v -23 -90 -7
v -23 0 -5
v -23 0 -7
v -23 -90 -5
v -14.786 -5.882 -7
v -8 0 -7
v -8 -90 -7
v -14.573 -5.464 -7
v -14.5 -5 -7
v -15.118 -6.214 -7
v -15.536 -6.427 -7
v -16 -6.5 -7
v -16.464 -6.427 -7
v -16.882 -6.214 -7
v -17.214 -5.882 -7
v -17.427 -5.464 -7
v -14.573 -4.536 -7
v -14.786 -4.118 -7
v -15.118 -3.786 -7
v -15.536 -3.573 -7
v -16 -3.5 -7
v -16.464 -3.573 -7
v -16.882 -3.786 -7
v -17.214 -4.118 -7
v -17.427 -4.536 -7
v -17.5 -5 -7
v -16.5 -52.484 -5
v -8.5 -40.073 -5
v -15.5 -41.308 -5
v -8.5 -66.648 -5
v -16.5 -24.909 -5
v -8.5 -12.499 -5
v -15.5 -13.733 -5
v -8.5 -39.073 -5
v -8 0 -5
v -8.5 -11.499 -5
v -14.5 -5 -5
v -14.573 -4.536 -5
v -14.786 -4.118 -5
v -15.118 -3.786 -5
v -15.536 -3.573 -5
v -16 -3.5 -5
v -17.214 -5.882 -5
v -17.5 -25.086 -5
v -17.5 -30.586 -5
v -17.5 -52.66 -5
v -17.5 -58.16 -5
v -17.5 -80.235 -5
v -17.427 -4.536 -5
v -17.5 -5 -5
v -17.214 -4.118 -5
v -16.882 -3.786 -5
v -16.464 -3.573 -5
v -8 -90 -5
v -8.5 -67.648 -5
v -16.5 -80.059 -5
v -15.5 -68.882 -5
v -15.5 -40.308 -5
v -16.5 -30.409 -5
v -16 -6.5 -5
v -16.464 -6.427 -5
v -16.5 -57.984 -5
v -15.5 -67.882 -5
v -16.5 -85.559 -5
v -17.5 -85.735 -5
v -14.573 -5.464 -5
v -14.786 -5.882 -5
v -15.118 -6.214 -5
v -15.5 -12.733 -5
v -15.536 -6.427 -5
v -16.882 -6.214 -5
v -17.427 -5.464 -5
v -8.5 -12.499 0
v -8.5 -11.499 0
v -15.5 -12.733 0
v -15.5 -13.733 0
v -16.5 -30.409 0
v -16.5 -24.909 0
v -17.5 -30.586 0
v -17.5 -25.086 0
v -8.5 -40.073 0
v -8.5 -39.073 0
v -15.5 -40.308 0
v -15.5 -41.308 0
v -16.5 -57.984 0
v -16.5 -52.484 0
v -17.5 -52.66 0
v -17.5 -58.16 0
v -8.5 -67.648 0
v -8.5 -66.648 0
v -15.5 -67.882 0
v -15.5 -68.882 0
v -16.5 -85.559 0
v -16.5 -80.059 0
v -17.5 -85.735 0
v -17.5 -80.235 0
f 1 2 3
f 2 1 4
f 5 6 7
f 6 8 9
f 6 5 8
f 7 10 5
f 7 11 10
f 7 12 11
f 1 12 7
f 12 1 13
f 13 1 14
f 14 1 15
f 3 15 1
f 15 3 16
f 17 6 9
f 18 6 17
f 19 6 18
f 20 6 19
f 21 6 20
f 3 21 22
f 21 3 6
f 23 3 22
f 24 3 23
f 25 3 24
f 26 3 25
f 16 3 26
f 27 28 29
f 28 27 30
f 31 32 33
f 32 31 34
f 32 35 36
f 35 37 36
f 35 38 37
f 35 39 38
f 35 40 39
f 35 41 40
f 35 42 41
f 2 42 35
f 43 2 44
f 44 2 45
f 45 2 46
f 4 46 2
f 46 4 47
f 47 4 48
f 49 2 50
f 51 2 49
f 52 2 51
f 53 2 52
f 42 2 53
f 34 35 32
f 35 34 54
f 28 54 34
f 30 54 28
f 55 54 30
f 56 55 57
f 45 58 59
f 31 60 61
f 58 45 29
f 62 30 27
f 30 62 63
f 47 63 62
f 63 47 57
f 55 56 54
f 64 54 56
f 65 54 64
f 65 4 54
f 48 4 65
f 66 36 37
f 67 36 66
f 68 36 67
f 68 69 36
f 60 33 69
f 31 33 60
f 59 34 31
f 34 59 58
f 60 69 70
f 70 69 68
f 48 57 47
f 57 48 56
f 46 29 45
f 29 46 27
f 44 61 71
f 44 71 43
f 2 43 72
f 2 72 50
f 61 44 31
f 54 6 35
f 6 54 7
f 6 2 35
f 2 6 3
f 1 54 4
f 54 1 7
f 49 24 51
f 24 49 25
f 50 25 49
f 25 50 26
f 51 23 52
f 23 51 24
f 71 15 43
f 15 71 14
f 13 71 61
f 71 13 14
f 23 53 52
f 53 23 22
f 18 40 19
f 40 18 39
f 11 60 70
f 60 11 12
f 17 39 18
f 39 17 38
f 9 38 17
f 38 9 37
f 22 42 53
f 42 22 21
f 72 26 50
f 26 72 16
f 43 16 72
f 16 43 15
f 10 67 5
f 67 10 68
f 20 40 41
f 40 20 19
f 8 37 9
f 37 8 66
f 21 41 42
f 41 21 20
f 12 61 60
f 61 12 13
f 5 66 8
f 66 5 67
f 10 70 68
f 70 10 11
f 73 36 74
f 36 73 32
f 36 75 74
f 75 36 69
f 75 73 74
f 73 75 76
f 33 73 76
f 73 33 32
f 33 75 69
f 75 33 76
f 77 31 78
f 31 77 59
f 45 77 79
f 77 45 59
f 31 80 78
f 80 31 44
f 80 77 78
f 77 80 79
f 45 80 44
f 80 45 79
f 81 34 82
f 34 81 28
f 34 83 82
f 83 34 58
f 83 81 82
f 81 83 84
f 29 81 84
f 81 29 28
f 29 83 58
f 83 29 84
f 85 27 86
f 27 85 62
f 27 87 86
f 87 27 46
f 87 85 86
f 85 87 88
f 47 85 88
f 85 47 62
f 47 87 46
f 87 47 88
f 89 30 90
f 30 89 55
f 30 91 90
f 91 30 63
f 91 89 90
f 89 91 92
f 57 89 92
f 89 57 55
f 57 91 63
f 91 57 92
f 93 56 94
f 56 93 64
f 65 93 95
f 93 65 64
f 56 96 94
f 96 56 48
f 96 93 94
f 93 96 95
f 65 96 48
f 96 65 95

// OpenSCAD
// file: memory.scad
include <globs.scad>;

$fn = 20;

/** delta_y is how much a cell moves down for each cell across we move. */
delta_y  = memory_cell_pitch_x * tan(memory_slope);


/*

       |
       |
       |
       |
       |
       |
       |

*/

/** Memory block - the shape which holds and releases a ball bearing. This is designed for a 6mm ball bearing - it will have to be redesigned if not. */
module memory_block()
{
  block_height = memory_cell_pitch_y - 8*cos(memory_slope);
  block_width = memory_cell_pitch_x - 1;
  difference() {
    // Outline/bounding box of the block
    polygon(points = [[0,0], [block_width, -delta_y],
		      [block_width, -delta_y-block_height], [0, -block_height]]);
    // Upper left chamber cut-out
    hull() {
      polygon(points = [[-0.1,-1], [1, -1.1*tan(memory_slope)-1],
			[1, 1.1*tan(memory_slope)-9],
			[-0.1, -1.1*tan(memory_slope)-9]]);
      translate([3.5,-3.5*tan(memory_slope)-4.5]) circle(d=7);
    }

    // Lower left chamber cut-out

    hull() {
      polygon(points = [[-0.1,-11], [1, -1.1*tan(memory_slope)-11],
			[1, -1.1*tan(memory_slope)-20],
			[-0.1, -1.1*tan(memory_slope)-20]]);
      polygon(points = [[-0.1,-20], [7, -7.1*tan(memory_slope)-20],
			[7, -7.1*tan(memory_slope)-22],
			[-0.1, -7.1*tan(memory_slope)-22]]);
      translate([3.5,-3.5*tan(memory_slope)-11-3.5]) circle(d=7);
    }

    // Right chamber cut out
    hull() {
      polygon(points = [[8,0],[memory_cell_pitch_x+0.1,0],[memory_cell_pitch_x+0.1,-block_height+1-delta_y],[8,-block_height+3.5-8*tan(memory_slope)+1]]);
      translate([11.5,-11.5*tan(memory_slope)-11-3.5]) circle(d=7);
    }
  } // end of difference
}

module horizontal_stop_bar()
{
  polygon(points = [[0,0],[7, -7*tan(memory_slope)],
		    [7, -7*tan(memory_slope)-1],[0,-1]]);
}

module vertical_stop_bar()
{
  polygon(points = [[0,0],[1, -1*tan(memory_slope)],
		    [1, -1*tan(memory_slope)-5.5],[0,-5.5]]);
}


/* ----------------- TEST SECTION ------------------------ */

/* Test objects */
for(x = [0:3]) {
  for(y = [0:3]) {
    translate([memory_cell_pitch_x * x,
	       -delta_y * x - memory_cell_pitch_y*y]) linear_extrude(height=6) memory_block();
  }
}
//  translate([5,-100,5]) cube([memory_cell_pitch_x - 1, 100,2]);

for(y = [0:3]) {
  translate([0,-8*0.5*(1+cos($t*360)) - y*memory_cell_pitch_y]) {
    color([1.0,0,0]) translate([8.5, -8.5*tan(memory_slope)]) linear_extrude(height=8) horizontal_stop_bar();
    color([0,1.0,0]) translate([15.5, -15.5*tan(memory_slope)-14]) linear_extrude(height=8) vertical_stop_bar();
  }
 }

/* Test balls */
translate([12,-25.5,3]) sphere(d=6);
// file: globs.scad
/* Global definitions for millihertz 5 */

/* All dimensions are in millimetres */
memory_slope = 10; // Degrees

/** Memory cell pitch - the horizontal and vertical distances between one row and the next. Memory is arranged so one column (y) make up one word. Words are laid out vertically. */
memory_cell_pitch_x = 16;
memory_cell_pitch_y = 28 * cos(memory_slope);

/* Number of bits used in the data. This must be 32. */
bits = 32;

/** Accumulator / subtractor unit. Pitch is the horizontal spacing between both input and output. */
accumulator_input_pitch = 22;

/** Frame */

frame_internal_width = 900;
frame_internal_height = 2200;

/** Frame will probably be 50mm angle iron */
frame_width = 50;
// main file
/* A 3d printed small test of the memory cell selector unit */
include <globs.scad>;
use <memory.scad>;

rotate([0,180,0]) 

union() {
  difference() {
    translate([8,-90,5]) cube([memory_cell_pitch_x - 1, 90,2]);
    translate([16,-5,-1]) cylinder(d=3, h=10, $fn=20);
  }
  for(y = [0:2]) {

    translate([0,-10-memory_cell_pitch_y*y,0]) {
    color([1.0,0,0]) translate([8.5, -8.5*tan(memory_slope)]) linear_extrude(height=7) horizontal_stop_bar();
    color([0,1.0,0]) translate([16.5, -16.5*tan(memory_slope)-12]) linear_extrude(height=7) vertical_stop_bar();
  }
  }
}
